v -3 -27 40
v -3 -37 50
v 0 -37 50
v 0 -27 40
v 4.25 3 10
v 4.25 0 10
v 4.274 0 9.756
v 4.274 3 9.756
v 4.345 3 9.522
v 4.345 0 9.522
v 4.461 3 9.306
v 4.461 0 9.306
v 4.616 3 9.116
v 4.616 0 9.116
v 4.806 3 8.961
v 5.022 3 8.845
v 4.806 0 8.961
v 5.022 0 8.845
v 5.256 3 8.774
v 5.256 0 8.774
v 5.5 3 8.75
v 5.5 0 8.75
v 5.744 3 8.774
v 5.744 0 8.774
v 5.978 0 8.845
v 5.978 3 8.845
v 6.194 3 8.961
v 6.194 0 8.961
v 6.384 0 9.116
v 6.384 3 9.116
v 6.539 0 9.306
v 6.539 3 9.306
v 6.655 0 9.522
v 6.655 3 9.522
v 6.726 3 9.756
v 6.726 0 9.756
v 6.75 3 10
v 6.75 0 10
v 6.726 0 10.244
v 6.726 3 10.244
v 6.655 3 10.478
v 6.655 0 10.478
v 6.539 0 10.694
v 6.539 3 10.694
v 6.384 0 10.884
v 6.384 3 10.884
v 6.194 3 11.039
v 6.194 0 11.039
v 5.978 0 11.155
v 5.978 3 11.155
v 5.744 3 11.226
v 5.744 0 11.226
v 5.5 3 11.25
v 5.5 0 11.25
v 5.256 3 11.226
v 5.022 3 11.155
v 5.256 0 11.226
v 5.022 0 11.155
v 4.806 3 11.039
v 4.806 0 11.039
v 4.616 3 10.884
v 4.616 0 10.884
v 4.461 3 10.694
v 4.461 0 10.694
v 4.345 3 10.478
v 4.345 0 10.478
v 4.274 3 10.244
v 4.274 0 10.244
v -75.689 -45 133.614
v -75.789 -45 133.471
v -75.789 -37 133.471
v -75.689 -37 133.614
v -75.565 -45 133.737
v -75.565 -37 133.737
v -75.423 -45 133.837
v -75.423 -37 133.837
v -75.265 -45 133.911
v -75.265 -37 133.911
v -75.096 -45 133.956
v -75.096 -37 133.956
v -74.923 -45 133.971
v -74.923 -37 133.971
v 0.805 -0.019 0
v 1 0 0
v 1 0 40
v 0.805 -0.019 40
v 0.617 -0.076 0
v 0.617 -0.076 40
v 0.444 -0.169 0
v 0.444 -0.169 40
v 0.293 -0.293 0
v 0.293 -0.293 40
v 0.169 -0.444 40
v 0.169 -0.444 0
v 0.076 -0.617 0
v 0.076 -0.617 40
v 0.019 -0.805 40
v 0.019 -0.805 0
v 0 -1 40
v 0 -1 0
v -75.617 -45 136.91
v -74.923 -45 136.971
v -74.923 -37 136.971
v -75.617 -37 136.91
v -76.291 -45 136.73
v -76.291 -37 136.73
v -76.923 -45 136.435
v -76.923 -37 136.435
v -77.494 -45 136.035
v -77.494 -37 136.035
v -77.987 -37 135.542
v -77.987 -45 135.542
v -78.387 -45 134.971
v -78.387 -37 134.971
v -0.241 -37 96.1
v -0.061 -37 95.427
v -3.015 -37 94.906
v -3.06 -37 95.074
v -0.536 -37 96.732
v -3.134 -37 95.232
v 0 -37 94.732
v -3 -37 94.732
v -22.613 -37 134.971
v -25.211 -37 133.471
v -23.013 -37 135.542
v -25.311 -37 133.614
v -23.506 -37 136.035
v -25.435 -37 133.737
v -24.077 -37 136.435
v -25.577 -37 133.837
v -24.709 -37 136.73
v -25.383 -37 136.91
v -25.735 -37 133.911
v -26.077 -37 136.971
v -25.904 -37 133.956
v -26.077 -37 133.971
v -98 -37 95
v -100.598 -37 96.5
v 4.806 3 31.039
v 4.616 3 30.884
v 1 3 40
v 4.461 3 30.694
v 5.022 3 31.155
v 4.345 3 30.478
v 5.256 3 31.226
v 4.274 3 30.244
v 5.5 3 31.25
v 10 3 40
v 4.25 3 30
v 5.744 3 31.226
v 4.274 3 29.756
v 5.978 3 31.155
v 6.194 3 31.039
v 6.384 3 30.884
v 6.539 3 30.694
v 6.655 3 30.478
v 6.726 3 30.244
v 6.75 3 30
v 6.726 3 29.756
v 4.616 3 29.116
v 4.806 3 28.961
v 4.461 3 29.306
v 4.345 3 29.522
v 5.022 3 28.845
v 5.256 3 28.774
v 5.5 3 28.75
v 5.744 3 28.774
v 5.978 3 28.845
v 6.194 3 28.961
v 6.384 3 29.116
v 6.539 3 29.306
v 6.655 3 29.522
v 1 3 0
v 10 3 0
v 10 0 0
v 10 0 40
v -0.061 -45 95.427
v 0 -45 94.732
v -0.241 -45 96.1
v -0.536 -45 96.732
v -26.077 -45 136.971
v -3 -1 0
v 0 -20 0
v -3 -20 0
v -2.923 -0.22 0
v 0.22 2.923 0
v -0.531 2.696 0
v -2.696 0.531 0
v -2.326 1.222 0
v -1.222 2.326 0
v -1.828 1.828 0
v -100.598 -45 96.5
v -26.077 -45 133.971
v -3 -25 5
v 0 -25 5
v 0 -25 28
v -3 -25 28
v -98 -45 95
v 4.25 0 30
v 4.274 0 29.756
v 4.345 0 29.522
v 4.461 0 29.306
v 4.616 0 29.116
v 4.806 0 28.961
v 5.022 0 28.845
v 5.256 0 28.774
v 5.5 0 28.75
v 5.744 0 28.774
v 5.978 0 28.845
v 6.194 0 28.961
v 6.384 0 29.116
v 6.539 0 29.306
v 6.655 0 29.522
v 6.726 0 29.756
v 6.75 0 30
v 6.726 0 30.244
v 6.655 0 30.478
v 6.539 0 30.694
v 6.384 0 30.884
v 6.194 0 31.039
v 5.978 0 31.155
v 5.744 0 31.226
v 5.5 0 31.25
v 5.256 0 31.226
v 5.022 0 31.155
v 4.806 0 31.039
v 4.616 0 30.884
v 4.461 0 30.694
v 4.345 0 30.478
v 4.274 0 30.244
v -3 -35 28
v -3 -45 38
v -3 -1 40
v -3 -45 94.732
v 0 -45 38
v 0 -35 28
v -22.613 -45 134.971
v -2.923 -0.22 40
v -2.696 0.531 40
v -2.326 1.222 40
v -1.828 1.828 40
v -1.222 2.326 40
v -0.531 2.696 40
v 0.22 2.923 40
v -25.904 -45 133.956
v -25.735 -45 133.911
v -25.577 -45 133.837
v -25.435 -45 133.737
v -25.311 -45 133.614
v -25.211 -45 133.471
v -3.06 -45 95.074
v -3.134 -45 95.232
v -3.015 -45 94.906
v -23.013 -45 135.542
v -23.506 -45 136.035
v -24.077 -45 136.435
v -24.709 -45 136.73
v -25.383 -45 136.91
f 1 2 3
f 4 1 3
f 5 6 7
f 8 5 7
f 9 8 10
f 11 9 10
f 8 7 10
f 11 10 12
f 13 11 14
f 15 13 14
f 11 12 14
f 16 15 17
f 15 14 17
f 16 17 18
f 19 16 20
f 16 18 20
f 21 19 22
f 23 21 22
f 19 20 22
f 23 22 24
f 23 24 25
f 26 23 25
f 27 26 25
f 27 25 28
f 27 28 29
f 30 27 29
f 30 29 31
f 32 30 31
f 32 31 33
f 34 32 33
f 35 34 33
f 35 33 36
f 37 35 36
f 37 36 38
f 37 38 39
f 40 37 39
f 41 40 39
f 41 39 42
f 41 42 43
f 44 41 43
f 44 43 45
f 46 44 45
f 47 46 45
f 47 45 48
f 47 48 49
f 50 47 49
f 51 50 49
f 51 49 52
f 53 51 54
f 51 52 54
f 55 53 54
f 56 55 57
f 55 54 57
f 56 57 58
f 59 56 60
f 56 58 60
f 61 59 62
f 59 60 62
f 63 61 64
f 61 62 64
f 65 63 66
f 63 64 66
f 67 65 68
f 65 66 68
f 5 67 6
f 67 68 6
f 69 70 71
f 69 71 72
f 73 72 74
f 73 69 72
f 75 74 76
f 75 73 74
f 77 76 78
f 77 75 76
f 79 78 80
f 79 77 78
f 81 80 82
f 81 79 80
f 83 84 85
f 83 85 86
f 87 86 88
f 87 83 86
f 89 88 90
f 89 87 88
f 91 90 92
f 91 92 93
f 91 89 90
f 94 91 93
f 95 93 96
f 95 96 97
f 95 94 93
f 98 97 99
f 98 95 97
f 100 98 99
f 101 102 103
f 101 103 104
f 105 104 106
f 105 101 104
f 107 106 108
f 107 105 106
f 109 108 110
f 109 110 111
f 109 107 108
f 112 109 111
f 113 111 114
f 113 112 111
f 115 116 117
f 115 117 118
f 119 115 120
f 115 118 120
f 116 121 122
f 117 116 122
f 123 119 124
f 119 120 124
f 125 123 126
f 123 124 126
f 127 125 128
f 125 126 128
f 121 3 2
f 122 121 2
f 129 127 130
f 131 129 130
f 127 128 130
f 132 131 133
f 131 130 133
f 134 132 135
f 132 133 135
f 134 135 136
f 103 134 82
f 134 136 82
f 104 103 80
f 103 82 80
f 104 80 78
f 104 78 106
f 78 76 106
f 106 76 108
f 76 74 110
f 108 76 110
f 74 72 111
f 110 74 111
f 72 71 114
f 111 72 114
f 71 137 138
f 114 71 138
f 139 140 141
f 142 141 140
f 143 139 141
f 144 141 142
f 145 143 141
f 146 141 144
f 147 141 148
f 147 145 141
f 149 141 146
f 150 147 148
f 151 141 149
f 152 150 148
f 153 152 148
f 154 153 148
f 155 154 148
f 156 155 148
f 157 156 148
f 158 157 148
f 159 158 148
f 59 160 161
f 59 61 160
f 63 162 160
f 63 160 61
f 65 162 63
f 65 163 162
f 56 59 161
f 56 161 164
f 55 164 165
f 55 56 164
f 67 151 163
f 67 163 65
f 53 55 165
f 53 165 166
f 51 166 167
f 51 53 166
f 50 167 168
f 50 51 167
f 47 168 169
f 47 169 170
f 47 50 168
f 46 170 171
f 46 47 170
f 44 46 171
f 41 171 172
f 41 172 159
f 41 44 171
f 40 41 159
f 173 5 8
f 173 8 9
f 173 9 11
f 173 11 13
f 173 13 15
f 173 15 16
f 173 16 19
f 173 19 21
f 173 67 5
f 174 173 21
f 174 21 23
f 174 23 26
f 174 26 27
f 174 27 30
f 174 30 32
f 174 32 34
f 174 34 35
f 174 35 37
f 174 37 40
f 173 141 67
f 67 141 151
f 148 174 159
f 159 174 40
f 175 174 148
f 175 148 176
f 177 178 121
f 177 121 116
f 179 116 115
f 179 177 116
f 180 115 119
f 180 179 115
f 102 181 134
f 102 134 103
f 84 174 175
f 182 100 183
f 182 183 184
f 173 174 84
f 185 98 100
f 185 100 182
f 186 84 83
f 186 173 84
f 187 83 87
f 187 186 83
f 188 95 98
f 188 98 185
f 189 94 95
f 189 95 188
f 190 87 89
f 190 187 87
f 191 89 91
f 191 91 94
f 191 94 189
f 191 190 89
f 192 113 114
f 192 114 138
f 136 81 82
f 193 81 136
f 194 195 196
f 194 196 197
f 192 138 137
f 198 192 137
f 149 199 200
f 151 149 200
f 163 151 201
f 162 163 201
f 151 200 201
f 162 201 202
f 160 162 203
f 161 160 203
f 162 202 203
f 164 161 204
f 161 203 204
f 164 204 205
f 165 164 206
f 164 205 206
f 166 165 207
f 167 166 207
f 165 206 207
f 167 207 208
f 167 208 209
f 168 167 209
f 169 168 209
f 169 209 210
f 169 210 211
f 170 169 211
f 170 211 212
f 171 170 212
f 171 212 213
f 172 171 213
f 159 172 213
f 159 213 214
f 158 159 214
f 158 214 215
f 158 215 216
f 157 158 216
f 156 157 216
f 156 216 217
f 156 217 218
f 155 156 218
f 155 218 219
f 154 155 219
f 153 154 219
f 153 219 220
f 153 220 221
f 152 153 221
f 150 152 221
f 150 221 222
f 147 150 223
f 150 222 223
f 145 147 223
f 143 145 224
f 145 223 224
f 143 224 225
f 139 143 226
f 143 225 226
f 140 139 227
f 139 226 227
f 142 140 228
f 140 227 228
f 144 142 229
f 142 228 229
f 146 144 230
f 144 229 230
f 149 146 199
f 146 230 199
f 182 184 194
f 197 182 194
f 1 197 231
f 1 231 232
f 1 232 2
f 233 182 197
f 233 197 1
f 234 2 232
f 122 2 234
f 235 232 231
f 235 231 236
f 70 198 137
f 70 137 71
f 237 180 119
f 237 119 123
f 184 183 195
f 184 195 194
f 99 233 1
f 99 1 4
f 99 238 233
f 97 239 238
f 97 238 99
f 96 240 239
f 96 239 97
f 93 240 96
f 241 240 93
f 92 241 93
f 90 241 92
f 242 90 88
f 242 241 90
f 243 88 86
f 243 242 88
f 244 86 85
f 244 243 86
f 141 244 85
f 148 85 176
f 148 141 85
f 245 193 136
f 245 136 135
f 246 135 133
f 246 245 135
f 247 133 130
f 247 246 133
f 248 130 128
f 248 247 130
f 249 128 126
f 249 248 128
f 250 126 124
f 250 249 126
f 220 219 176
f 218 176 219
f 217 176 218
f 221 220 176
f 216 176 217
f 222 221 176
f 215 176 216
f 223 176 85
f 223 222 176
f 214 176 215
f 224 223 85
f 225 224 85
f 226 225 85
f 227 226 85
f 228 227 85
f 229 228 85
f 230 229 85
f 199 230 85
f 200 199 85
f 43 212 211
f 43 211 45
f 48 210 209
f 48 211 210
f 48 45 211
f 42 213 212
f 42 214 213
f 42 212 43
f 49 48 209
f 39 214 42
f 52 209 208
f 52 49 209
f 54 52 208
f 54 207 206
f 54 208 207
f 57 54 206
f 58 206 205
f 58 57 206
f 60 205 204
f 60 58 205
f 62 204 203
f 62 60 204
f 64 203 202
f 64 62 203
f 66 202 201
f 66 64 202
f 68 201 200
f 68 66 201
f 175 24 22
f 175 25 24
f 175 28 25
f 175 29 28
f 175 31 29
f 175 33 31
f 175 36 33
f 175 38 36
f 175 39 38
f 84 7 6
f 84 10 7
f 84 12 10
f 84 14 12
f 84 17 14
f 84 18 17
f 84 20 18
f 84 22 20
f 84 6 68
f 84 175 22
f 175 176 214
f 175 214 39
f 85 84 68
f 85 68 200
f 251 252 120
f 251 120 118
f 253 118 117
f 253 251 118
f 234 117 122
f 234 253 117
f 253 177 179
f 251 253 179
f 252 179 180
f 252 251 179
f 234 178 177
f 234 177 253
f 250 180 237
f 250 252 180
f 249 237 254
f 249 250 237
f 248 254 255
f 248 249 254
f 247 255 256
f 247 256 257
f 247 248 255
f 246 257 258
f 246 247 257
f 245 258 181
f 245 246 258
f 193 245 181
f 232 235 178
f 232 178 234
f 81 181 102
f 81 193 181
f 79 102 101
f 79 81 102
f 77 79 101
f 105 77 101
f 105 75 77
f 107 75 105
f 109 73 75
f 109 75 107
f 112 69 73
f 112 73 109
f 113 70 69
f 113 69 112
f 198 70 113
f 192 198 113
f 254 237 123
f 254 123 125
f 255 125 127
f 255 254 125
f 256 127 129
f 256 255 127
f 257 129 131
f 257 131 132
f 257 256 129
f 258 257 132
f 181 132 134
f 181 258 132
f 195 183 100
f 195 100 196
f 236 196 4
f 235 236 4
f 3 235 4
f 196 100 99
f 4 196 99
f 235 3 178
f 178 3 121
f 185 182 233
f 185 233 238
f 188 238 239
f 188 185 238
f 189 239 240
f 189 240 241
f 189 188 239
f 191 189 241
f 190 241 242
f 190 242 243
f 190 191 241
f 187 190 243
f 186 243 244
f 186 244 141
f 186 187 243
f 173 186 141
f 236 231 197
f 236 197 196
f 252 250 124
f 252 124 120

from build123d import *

# Parameters (mm, degrees)
SM_BASE_FLANGE_1_DEPTH           = 40
M3X0_5_1_D                       = 2.5
SKETCH_22_W                      = 3
SKETCH_22_H                      = 12
EXTRUDE_6_DEPTH                  = 12
SKETCH_23_W                      = 3
SKETCH_23_H                      = 67
EXTRUDE_7_DEPTH                  = 8
CHAMFER_1_SIZE                   = 10
CHAMFER_2_SIZE                   = 5
SM_EDGE_FLANGE_1_STRIP_CUT_DEPTH = 8
SM_EDGE_FLANGE_1_DEPTH           = 8
SM_EDGE_FLANGE_2_STRIP_CUT_DEPTH = 8
SM_EDGE_FLANGE_2_DEPTH           = 8
SM_EDGE_FLANGE_3_STRIP_CUT_DEPTH = 8
SM_EDGE_FLANGE_3_DEPTH           = 8


# Sheet-metal steps are written as plain solids
with BuildPart() as part:
    # 草圖3 → 基材-凸緣1 (new body)
    with BuildSketch(Plane.XY):
        with BuildLine():
            Line((10, 0), (1, 0))
            ThreePointArc((1, 0), (0.292893219, -0.292893219), (0, -1))
            Line((0, -1), (0, -25))
            Line((0, -25), (-3, -25))
            Line((-3, -25), (-3, -1))
            ThreePointArc((-3, -1), (-1.828427125, 1.828427125), (1, 3))
            Line((1, 3), (10, 3))
            Line((10, 3), (10, 0))
        make_face()
    extrude(amount=SM_BASE_FLANGE_1_DEPTH)

    # M3x0.5 螺紋孔1 (through all)
    with Locations(Plane(origin=(0, 3, 0), x_dir=(1, 0, 0), z_dir=(0, 1, 0))):
        with Locations((5.5, -30), (5.5, -10)):
            Hole(M3X0_5_1_D / 2)

    # 草圖22 → 填料-伸長6 (add)
    with BuildSketch(Plane.XZ.offset(25)):
        with Locations((-1.5, 34)):
            Rectangle(SKETCH_22_W, SKETCH_22_H)
    extrude(amount=EXTRUDE_6_DEPTH)

    # 草圖23 → 填料-伸長7 (add)
    with BuildSketch(Plane.XZ.offset(37)):
        with Locations((-1.5, 61.5)):
            Rectangle(SKETCH_23_W, SKETCH_23_H)
    extrude(amount=EXTRUDE_7_DEPTH)

    # 導角1
    chamfer_1_edges = [part.edges().sort_by_distance(p)[0] for p in [
        (-1.5, -37, 40),
        (-1.5, -45, 28),
    ]]
    chamfer(chamfer_1_edges, length=CHAMFER_1_SIZE)

    # 導角2
    chamfer_2_edges = [part.edges().sort_by_distance(p)[0] for p in [
        (-1.5, -25, 0),
    ]]
    chamfer(chamfer_2_edges, length=CHAMFER_2_SIZE)

    # 邊線-凸緣1 strip (across the edge) → 邊線-凸緣1 strip cut (cut)
    with BuildSketch(Plane(origin=(-3, -45, 95), x_dir=(-0.8660254037844416, 0, -0.49999999999999495), z_dir=(0, 1, 0))):
        Polygon((-9.464101615, 10.392304845), (-2.464101615, -1.732050808), (0.133974596, -0.232050808), (-6.866025404, 11.892304845), align=None)
    extrude(amount=SM_EDGE_FLANGE_1_STRIP_CUT_DEPTH, mode=Mode.SUBTRACT)

    # 邊線-凸緣1 section (across the edge) → 邊線-凸緣1 (add)
    with BuildSketch(Plane(origin=(-3, -45, 95), x_dir=(-0.8660254037844416, 0, -0.49999999999999495), z_dir=(0, 1, 0))):
        with BuildLine():
            Line((-3, 0.267949192), (-3, 45))
            Line((-3, 45), (0, 45))
            Line((0, 45), (0, 0.267949192))
            ThreePointArc((0, 0.267949192), (0.034074174, 0.009130147), (0.133974596, -0.232050808))
            Line((0.133974596, -0.232050808), (-2.464101615, -1.732050808))
            ThreePointArc((-2.464101615, -1.732050808), (-2.863703305, -0.767326988), (-3, 0.267949192))
        make_face()
    extrude(amount=SM_EDGE_FLANGE_1_DEPTH)

    # 邊線-凸緣2 strip (across the edge) → 邊線-凸緣2 strip cut (cut)
    with BuildSketch(Plane(origin=(-25.5, -45, 133.97114317), x_dir=(0, 0, -1), z_dir=(0, 1, 0))):
        Polygon((-13.124355653, 4.113248654), (-1, -2.886751346), (0.5, -0.288675135), (-11.624355653, 6.711324865), align=None)
    extrude(amount=SM_EDGE_FLANGE_2_STRIP_CUT_DEPTH, mode=Mode.SUBTRACT)

    # 邊線-凸緣2 section (across the edge) → 邊線-凸緣2 (add)
    with BuildSketch(Plane(origin=(-25.5, -45, 133.97114317), x_dir=(0, 0, -1), z_dir=(0, 1, 0))):
        with BuildLine():
            Line((-3, 0.577350269), (-3, 50))
            Line((-3, 50), (0, 50))
            Line((0, 50), (0, 0.577350269))
            ThreePointArc((0, 0.577350269), (0.133974596, 0.077350269), (0.5, -0.288675135))
            Line((0.5, -0.288675135), (-1, -2.886751346))
            ThreePointArc((-1, -2.886751346), (-2.464101615, -1.422649731), (-3, 0.577350269))
        make_face()
    extrude(amount=SM_EDGE_FLANGE_2_DEPTH)

    # 邊線-凸緣3 strip (across the edge) → 邊線-凸緣3 strip cut (cut)
    with BuildSketch(Plane(origin=(-75.5, -45, 133.97114317), x_dir=(0.8660254037844312, 0, -0.5000000000000132), z_dir=(0, 1, 0))):
        Polygon((-13.124355653, 4.113248654), (-1, -2.886751346), (0.5, -0.288675135), (-11.624355653, 6.711324865), align=None)
    extrude(amount=SM_EDGE_FLANGE_3_STRIP_CUT_DEPTH, mode=Mode.SUBTRACT)

    # 邊線-凸緣3 section (across the edge) → 邊線-凸緣3 (add)
    with BuildSketch(Plane(origin=(-75.5, -45, 133.97114317), x_dir=(0.8660254037844312, 0, -0.5000000000000132), z_dir=(0, 1, 0))):
        with BuildLine():
            Line((-3, 0.577350269), (-3, 45))
            Line((-3, 45), (0, 45))
            Line((0, 45), (0, 0.577350269))
            ThreePointArc((0, 0.577350269), (0.133974596, 0.077350269), (0.5, -0.288675135))
            Line((0.5, -0.288675135), (-1, -2.886751346))
            ThreePointArc((-1, -2.886751346), (-2.464101615, -1.422649731), (-3, 0.577350269))
        make_face()
    extrude(amount=SM_EDGE_FLANGE_3_DEPTH)


solid = part.part
